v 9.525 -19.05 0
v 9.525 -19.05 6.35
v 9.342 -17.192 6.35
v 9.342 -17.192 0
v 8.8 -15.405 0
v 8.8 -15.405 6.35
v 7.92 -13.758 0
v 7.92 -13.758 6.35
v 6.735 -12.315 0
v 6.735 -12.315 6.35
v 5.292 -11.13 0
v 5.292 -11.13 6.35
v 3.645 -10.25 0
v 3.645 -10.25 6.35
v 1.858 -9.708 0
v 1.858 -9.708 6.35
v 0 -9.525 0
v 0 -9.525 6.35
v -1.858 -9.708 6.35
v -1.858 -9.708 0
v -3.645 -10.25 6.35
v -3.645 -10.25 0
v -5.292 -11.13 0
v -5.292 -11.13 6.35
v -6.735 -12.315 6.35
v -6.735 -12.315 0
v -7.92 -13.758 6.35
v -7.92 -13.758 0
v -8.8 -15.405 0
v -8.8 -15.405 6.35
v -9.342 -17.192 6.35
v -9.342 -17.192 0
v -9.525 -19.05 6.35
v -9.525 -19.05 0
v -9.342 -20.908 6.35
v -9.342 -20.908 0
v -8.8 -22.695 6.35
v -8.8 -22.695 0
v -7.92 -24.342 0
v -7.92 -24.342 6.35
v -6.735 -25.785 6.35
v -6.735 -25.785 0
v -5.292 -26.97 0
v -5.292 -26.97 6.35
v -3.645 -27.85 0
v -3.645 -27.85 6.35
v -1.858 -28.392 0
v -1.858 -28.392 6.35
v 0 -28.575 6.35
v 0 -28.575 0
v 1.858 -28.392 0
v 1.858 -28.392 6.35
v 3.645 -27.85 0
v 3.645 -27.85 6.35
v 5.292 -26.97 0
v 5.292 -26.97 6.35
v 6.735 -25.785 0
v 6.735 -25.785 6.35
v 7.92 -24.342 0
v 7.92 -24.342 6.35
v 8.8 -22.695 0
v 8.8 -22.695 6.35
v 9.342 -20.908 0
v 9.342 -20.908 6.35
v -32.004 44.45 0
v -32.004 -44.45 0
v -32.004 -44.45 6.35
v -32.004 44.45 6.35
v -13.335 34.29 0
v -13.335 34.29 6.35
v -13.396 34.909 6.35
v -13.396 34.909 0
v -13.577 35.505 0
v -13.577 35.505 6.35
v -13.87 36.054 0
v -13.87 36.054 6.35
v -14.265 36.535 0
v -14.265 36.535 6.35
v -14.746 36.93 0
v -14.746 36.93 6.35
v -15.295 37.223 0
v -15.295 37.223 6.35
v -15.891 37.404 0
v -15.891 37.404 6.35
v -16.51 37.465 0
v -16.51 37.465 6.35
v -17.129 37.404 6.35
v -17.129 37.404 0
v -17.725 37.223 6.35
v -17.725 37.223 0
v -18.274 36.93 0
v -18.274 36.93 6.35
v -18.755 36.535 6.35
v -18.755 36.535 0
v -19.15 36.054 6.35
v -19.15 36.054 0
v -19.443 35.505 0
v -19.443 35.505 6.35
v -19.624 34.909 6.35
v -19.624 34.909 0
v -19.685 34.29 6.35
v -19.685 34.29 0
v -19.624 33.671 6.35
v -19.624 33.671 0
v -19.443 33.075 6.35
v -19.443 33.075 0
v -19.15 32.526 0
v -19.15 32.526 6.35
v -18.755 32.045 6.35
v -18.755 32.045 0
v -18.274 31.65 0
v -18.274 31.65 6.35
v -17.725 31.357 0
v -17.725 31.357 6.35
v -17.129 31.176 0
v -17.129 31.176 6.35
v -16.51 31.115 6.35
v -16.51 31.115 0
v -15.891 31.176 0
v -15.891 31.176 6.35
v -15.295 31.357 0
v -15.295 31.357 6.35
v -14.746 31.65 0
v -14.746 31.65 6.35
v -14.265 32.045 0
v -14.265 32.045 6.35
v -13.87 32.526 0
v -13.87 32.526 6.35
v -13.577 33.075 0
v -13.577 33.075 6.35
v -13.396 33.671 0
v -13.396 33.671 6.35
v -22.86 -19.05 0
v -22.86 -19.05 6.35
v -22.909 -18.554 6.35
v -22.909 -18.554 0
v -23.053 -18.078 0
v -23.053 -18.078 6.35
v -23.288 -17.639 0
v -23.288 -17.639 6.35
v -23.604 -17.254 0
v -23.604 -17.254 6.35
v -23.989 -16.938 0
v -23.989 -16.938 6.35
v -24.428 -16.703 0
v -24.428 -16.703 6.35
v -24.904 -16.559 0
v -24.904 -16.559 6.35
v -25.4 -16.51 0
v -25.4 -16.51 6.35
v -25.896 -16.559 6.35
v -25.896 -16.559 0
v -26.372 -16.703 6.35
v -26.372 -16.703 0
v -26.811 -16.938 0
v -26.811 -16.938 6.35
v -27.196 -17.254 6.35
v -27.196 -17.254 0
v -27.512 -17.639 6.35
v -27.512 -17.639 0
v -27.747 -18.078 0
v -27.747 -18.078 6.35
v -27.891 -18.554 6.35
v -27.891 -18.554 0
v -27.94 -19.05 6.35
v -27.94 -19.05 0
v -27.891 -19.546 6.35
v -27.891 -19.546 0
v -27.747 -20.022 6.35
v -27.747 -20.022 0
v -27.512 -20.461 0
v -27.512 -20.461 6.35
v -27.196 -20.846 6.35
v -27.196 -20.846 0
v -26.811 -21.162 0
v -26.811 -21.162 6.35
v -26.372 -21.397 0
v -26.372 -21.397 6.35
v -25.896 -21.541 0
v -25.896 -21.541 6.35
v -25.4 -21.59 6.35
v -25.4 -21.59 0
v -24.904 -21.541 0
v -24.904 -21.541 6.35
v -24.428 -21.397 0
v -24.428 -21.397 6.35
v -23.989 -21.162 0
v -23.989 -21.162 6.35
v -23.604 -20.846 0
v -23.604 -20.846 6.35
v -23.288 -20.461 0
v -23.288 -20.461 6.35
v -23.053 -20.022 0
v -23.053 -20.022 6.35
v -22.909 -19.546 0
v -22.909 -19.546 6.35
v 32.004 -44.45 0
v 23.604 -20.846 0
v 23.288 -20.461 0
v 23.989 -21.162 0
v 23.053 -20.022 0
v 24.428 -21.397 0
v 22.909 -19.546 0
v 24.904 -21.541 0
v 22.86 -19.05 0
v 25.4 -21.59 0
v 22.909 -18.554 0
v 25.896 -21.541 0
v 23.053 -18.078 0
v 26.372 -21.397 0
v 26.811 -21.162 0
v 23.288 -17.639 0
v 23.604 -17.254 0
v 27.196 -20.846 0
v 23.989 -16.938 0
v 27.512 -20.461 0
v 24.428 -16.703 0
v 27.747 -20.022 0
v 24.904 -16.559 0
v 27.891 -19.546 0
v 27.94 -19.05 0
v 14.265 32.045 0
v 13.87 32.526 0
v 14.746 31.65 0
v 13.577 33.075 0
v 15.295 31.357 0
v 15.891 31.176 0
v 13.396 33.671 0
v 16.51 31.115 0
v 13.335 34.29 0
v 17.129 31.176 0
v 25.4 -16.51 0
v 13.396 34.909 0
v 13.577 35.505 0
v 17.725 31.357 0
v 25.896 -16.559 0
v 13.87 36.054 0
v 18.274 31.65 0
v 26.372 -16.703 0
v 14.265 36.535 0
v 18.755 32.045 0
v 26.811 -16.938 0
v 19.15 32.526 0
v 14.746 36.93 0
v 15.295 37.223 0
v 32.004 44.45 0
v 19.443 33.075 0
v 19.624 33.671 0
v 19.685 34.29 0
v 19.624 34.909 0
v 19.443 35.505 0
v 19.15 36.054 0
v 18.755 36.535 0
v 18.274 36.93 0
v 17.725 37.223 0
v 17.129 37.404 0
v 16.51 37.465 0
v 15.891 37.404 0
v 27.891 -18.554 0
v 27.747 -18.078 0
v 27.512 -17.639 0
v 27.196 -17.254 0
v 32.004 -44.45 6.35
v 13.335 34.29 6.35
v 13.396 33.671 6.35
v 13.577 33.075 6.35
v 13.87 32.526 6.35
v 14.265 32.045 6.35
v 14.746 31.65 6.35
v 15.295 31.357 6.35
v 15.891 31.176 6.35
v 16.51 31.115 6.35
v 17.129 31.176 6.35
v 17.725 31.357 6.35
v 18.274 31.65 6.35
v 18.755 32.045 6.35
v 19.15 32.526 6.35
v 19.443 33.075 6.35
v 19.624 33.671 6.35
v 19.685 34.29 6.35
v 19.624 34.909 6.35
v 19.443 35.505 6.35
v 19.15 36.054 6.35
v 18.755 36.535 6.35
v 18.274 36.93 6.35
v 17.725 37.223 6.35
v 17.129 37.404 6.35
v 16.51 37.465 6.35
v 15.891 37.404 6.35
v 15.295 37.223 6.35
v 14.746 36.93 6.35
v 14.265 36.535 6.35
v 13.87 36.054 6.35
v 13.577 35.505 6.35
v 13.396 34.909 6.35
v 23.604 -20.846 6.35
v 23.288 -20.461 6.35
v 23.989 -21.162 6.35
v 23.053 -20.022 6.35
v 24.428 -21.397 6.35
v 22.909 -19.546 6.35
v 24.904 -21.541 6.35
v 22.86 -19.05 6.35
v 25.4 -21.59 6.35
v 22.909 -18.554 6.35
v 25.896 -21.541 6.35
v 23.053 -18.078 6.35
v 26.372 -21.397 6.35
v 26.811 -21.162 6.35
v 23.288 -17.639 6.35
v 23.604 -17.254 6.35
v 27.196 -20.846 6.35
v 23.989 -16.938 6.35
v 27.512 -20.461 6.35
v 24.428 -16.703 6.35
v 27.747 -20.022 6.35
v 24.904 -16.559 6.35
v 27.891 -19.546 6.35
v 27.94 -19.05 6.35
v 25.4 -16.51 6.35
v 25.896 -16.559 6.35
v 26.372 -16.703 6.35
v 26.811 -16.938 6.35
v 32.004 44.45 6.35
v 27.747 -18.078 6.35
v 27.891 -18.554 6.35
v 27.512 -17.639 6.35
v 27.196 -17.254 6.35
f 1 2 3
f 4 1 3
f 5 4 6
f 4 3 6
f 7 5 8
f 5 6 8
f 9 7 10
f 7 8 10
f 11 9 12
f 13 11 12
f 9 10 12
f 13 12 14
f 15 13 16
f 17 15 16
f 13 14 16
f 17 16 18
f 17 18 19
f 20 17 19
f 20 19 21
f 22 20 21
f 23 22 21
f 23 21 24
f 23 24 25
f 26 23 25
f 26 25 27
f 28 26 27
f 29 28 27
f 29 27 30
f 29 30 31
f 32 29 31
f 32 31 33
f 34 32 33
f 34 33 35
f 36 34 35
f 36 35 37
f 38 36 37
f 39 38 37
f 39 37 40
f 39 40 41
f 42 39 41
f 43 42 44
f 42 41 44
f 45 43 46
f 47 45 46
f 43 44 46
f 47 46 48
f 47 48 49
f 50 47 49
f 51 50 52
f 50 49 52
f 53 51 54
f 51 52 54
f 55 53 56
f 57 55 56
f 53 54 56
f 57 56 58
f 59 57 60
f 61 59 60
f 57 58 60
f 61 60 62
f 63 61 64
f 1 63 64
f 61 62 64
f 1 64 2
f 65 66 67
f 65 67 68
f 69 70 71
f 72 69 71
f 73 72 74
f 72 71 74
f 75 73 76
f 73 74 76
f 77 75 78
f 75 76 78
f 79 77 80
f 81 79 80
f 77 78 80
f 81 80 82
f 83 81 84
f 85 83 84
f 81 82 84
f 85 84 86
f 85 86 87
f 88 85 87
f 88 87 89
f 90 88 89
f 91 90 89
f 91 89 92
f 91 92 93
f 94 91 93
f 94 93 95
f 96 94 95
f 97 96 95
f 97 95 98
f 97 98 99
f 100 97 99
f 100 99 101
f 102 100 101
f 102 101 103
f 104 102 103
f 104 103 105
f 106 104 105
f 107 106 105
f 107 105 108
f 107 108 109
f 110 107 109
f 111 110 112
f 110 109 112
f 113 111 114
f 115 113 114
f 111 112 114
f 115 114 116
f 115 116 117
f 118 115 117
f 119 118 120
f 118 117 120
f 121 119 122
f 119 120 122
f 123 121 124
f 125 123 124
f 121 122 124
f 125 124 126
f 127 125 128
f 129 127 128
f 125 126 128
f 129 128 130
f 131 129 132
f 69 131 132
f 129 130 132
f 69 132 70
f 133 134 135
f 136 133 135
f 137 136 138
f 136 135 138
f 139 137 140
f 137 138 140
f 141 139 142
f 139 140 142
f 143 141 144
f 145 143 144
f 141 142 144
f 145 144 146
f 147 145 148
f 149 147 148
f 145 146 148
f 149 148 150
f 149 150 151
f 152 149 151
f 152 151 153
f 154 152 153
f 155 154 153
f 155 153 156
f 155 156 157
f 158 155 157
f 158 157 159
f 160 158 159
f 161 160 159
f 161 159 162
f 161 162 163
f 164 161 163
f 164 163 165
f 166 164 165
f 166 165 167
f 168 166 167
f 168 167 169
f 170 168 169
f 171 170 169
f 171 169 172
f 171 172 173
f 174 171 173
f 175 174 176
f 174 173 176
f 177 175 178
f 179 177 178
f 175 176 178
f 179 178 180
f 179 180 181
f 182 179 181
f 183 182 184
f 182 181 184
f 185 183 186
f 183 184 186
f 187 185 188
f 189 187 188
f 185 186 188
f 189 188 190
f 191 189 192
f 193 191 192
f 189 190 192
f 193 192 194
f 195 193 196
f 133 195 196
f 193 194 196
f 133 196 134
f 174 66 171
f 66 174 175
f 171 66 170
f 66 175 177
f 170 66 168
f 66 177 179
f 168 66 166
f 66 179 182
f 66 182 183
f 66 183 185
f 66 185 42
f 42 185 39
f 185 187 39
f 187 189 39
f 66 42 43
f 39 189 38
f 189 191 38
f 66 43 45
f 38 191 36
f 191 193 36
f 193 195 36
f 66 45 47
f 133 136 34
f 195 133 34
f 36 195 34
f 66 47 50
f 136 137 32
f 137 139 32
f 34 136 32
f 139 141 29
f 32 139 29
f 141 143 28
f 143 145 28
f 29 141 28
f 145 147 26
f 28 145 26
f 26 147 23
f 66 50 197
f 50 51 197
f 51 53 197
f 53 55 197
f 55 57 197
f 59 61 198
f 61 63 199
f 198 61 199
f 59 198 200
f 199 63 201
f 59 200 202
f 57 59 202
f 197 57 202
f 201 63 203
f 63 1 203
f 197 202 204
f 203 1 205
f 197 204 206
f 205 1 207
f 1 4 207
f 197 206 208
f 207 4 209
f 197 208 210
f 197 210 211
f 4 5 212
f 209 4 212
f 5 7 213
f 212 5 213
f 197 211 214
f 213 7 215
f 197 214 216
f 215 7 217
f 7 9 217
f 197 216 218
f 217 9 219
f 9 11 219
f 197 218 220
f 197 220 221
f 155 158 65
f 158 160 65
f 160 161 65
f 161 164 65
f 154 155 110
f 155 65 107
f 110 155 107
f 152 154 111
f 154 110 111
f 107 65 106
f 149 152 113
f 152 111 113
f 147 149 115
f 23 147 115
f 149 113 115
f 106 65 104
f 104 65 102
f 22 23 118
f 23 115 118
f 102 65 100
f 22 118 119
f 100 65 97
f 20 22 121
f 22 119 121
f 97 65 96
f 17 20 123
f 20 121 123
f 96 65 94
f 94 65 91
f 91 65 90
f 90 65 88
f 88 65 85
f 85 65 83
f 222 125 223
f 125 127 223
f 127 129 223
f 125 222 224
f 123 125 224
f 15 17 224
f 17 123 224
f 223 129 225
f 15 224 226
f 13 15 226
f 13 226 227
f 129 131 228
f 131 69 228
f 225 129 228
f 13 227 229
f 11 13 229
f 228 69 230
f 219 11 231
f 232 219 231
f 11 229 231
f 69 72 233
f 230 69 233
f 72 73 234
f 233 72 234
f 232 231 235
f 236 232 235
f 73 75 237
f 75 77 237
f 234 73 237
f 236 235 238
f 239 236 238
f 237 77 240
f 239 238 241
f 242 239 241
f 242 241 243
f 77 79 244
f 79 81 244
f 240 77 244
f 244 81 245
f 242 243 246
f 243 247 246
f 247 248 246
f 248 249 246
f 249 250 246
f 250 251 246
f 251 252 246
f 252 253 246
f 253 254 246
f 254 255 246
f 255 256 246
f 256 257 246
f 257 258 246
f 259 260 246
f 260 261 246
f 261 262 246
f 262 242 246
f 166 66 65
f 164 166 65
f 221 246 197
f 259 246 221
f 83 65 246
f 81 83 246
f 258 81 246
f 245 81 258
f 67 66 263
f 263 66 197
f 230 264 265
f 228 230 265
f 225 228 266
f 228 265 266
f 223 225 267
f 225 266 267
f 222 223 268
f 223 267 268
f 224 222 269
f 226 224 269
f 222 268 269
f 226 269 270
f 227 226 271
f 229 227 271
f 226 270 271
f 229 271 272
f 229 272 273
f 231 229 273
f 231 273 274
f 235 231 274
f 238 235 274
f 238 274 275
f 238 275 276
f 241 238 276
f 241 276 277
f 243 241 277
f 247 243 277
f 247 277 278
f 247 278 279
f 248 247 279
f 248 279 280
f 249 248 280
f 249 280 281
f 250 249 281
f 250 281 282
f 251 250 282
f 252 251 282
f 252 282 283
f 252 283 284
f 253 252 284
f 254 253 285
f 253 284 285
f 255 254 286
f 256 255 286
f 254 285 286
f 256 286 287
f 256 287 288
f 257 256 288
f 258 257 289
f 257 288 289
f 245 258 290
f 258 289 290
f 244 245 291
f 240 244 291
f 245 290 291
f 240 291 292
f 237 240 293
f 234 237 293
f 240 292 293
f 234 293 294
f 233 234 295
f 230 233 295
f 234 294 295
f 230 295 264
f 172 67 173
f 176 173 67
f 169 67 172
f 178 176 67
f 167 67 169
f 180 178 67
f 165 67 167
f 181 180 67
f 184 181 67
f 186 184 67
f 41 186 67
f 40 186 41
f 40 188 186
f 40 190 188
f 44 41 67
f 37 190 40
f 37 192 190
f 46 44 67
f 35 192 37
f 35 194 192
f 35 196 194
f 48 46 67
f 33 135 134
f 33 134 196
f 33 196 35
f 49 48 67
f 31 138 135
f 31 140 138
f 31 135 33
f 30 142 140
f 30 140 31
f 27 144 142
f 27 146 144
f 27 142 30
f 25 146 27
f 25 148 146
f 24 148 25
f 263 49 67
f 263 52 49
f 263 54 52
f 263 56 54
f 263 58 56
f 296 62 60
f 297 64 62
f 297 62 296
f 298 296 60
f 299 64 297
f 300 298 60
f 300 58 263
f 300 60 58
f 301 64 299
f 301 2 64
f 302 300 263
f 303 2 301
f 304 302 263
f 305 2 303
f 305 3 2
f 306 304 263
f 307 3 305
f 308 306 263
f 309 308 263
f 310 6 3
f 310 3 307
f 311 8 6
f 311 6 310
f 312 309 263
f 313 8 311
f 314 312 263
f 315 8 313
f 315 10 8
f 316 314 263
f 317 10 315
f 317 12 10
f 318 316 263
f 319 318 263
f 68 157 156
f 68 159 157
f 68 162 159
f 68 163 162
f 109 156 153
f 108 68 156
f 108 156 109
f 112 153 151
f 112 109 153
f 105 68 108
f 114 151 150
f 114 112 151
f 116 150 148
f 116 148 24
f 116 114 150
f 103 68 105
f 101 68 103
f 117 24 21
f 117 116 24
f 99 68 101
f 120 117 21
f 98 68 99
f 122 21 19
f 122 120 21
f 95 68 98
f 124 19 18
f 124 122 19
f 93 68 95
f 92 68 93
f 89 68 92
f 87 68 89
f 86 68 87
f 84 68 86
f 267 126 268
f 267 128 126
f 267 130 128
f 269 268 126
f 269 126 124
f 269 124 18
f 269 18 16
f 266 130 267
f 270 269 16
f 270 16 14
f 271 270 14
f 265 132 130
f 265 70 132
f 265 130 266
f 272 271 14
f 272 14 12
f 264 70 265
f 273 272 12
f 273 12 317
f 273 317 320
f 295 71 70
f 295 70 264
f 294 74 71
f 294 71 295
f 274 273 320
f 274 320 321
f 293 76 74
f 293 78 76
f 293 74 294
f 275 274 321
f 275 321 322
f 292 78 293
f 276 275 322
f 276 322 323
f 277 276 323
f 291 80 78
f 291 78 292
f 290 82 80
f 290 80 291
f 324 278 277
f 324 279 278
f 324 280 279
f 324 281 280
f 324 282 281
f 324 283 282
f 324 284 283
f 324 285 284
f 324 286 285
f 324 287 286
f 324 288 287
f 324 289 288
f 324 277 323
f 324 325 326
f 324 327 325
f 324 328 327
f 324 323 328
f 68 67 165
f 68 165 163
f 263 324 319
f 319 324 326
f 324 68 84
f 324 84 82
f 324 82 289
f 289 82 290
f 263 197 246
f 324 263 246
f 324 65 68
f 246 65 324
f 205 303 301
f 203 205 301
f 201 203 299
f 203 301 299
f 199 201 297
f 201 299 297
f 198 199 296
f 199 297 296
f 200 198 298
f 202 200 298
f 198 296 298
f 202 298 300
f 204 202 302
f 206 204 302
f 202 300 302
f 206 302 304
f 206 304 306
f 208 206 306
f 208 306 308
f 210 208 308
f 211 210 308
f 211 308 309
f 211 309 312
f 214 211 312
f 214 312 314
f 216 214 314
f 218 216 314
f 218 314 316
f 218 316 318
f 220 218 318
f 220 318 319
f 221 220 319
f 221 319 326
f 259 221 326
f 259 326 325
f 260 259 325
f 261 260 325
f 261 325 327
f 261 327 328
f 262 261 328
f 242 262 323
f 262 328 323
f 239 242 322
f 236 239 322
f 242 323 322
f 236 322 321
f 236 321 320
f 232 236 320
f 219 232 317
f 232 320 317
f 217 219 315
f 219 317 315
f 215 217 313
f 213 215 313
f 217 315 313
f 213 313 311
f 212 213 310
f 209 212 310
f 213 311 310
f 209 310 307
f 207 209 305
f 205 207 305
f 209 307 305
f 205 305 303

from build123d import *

# Parameters (mm, degrees)
SKETCH1_W      = 64.008
SKETCH1_H      = 88.9
EXTRUDE1_DEPTH = 6.35
SKETCH2_R      = 2.54
EXTRUDE2_DEPTH = 56.139650126
SKETCH3_R      = 9.525
EXTRUDE4_DEPTH = 56.139650126
SKETCH4_R      = 3.175
EXTRUDE5_DEPTH = 56.139650126


with BuildPart() as part:
    # Sketch1 → Extrude1 (new body)
    with BuildSketch(Plane.XY):
        Rectangle(SKETCH1_W, SKETCH1_H)
    extrude(amount=EXTRUDE1_DEPTH)

    # Sketch2 → Extrude2 (cut, through all)
    with BuildSketch(Plane.XY.offset(6.35)):
        with Locations((-25.4, -19.05)):
            Circle(SKETCH2_R)
        with Locations(Location((25.4, -19.05, 0), (0, 0, 180))):
            Circle(SKETCH2_R)
    extrude(amount=-EXTRUDE2_DEPTH, mode=Mode.SUBTRACT)

    # Sketch3 → Extrude4 (cut, through all)
    with BuildSketch(Plane.XY.offset(6.35)):
        with Locations((0, -19.05)):
            Circle(SKETCH3_R)
    extrude(amount=-EXTRUDE4_DEPTH, mode=Mode.SUBTRACT)

    # Sketch4 → Extrude5 (cut, through all)
    with BuildSketch(Plane.XY.offset(6.35)):
        with Locations((-16.51, 34.29)):
            Circle(SKETCH4_R)
        with Locations(Location((16.51, 34.29, 0), (0, 0, 180))):
            Circle(SKETCH4_R)
    extrude(amount=-EXTRUDE5_DEPTH, mode=Mode.SUBTRACT)


solid = part.part
